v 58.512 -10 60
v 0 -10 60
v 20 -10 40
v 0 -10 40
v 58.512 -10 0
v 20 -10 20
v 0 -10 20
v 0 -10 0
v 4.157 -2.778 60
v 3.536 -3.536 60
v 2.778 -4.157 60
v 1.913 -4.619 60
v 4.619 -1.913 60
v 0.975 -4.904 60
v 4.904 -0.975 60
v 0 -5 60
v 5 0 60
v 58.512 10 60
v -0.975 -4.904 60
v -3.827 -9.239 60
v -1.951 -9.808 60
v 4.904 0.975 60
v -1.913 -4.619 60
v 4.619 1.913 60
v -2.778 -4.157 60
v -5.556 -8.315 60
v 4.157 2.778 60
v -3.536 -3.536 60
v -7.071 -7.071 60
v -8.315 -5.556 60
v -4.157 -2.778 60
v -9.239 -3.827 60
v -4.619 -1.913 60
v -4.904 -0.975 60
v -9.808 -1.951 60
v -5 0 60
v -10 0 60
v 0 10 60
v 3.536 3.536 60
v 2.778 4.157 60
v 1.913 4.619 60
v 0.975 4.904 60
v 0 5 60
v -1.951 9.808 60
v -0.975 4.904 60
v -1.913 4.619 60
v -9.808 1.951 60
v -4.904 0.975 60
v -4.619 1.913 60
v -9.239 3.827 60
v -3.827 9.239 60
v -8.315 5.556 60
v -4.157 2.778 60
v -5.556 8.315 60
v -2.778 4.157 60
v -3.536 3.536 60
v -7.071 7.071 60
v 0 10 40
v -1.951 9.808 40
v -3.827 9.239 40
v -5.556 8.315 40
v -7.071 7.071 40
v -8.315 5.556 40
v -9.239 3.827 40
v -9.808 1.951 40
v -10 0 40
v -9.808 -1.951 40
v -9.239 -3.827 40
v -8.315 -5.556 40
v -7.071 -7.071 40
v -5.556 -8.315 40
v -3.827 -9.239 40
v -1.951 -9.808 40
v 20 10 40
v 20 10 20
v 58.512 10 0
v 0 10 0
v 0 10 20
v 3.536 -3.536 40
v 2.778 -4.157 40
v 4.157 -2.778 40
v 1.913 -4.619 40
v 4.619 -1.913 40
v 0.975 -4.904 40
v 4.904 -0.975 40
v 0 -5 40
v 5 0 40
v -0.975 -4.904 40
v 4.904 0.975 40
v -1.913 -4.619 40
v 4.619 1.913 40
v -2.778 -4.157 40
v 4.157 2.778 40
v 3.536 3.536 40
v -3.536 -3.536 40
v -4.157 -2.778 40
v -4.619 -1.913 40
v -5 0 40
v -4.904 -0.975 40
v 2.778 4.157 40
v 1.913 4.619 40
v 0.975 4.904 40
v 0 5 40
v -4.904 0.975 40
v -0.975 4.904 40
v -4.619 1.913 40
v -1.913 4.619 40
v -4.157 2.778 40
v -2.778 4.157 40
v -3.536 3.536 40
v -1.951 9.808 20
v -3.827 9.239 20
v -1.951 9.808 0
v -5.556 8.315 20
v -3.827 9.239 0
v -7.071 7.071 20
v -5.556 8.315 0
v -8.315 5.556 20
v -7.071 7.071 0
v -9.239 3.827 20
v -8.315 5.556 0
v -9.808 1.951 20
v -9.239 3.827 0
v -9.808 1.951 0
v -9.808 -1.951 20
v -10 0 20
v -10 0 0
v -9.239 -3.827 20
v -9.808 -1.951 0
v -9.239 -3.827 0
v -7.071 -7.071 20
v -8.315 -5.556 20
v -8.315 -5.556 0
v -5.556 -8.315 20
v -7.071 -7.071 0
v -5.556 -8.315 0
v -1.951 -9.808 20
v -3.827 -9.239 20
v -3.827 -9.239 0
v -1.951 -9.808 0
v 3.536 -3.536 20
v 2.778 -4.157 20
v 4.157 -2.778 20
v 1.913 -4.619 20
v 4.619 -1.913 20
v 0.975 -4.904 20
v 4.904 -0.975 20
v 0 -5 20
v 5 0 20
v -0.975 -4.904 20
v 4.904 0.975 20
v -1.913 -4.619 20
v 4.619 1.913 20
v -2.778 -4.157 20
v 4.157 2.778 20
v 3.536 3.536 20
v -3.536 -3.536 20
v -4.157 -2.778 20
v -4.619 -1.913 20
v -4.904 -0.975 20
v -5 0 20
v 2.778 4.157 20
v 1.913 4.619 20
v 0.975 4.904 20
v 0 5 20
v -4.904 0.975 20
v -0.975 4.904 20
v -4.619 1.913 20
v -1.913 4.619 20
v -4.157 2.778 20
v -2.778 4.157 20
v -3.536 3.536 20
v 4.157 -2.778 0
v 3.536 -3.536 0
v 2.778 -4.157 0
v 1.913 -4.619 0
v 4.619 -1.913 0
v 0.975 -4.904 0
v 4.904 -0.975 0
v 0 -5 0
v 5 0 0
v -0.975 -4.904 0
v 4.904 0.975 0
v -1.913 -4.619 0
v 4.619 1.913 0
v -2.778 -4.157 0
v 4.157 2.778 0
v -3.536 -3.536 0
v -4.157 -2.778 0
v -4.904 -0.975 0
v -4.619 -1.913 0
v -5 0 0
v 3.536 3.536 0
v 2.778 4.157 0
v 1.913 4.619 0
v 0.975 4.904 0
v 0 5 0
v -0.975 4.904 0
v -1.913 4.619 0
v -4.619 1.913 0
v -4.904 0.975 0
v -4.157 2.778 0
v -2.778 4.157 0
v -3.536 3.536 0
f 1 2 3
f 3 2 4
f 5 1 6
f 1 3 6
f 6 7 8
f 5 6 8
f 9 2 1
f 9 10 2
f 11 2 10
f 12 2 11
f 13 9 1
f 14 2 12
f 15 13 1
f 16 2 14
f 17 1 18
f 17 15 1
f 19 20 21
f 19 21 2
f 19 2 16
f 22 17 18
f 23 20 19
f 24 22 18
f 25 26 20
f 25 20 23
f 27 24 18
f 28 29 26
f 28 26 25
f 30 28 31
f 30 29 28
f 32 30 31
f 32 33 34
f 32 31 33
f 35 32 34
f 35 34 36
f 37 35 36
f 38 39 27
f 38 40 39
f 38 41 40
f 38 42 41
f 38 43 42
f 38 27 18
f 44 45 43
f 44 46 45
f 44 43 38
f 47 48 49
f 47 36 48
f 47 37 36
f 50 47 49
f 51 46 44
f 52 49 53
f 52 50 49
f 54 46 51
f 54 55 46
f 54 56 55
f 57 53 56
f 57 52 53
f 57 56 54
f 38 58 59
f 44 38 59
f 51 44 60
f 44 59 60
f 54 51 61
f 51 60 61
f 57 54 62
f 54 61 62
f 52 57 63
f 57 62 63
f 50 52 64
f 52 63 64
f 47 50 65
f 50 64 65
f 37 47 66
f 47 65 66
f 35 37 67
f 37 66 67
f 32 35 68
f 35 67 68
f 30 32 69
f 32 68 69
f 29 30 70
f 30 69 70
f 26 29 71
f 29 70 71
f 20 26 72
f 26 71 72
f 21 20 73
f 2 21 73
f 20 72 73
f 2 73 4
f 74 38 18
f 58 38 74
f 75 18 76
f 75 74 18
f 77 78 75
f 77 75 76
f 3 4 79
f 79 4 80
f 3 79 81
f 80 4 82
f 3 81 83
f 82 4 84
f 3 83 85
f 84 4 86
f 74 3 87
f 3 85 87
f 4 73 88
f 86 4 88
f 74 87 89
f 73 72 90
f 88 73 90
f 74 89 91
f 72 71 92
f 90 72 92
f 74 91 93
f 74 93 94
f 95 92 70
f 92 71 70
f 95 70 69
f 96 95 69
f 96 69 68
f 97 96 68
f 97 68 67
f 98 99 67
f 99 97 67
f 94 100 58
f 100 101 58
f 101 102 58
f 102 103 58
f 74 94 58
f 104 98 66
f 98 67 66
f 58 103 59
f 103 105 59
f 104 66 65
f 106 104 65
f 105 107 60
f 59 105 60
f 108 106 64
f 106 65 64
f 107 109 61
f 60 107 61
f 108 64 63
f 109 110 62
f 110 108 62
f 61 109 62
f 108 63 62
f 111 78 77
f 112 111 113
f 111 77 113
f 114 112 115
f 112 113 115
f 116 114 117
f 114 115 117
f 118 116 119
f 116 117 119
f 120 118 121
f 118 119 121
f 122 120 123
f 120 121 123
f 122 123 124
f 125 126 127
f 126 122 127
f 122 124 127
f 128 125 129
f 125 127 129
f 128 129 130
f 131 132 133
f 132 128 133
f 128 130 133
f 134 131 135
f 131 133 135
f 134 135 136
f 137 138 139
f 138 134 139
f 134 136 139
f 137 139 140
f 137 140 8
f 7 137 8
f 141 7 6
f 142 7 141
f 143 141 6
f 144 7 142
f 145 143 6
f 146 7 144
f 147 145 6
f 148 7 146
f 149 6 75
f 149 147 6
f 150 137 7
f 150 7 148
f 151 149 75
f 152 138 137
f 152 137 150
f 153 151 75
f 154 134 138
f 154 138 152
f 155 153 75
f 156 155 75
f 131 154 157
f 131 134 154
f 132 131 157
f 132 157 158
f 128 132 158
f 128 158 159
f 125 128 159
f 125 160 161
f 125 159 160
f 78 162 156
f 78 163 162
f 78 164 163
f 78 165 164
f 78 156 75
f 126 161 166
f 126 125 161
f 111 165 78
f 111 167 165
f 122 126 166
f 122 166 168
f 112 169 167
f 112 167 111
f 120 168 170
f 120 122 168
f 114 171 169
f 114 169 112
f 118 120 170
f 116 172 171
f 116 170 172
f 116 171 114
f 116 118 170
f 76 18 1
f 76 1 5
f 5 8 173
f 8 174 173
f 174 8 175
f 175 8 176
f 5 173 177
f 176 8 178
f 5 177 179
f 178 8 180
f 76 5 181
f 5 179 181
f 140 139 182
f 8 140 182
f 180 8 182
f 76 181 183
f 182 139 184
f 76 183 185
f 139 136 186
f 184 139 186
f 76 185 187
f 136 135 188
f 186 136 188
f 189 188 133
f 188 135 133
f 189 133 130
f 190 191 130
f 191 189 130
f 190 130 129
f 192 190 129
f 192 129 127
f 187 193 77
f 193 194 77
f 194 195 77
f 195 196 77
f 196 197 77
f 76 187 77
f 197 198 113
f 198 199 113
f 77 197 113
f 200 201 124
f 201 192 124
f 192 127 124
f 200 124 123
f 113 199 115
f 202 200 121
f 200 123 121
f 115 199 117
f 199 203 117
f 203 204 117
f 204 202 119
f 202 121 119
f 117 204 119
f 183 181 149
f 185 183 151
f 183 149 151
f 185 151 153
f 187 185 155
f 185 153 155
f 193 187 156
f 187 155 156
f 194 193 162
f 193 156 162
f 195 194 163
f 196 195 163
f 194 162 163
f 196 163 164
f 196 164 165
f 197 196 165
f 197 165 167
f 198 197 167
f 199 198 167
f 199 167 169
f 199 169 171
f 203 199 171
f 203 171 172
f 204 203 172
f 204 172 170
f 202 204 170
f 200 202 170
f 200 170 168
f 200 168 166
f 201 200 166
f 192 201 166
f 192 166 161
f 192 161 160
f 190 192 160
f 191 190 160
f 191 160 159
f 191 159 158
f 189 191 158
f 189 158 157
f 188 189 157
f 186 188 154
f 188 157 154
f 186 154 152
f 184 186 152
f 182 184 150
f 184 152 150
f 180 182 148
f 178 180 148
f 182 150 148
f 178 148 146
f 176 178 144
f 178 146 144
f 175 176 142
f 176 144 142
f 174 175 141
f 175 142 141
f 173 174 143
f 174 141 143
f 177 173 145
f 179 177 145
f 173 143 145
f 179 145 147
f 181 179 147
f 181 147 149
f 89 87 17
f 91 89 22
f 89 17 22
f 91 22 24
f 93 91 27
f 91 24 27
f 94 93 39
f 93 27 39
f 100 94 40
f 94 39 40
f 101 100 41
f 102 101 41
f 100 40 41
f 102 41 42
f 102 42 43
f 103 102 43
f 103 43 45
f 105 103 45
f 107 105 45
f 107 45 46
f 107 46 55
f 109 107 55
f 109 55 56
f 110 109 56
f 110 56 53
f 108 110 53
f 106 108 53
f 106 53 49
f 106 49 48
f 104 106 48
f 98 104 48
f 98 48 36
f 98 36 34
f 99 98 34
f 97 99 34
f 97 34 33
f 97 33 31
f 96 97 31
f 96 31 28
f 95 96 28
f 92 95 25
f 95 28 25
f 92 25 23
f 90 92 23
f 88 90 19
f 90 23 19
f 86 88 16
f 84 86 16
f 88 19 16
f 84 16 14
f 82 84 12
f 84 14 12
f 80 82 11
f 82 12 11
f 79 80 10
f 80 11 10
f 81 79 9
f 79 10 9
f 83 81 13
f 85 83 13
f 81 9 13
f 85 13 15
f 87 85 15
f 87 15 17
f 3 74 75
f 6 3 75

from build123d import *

# Parameters (mm, degrees)
SKETCH1_R               = 10
BOSS_EXTRUDE1_DEPTH     = 60
CUT_EXTRUDE1_DEPTH      = 20
CUT_EXTRUDE1_DEPTH_BACK = 40
SKETCH2_W               = 20
SKETCH2_H               = 28.944782362
SKETCH3_R               = 5
CUT_EXTRUDE3_DEPTH      = 120
SKETCH4_W               = 60
SKETCH4_H               = 20
BOSS_EXTRUDE2_DEPTH     = 5


with BuildPart() as part:
    # Sketch1 → Boss-Extrude1 (new body)
    with BuildSketch(Plane.XY):
        Circle(SKETCH1_R)
        with BuildLine():
            Line((53.512258846, 10), (0, 10))
            ThreePointArc((0, 10), (7.071067812, 7.071067812), (10, 0))
            ThreePointArc((10, 0), (7.071067812, -7.071067812), (0, -10))
            Line((0, -10), (53.512258846, -10))
            Line((53.512258846, -10), (53.512258846, 10))
        make_face()
    extrude(amount=BOSS_EXTRUDE1_DEPTH)

    # Sketch2 → Cut-Extrude1 (cut, two sides: drawn at the far end of the back side and taken through both)
    with BuildSketch(Plane(origin=(0, 0, 0), x_dir=(0, 0, -1), z_dir=(1, 0, 0)).offset(-CUT_EXTRUDE1_DEPTH_BACK)):
        with Locations((-30, 0)):
            Rectangle(SKETCH2_W, SKETCH2_H)
    extrude(amount=CUT_EXTRUDE1_DEPTH + CUT_EXTRUDE1_DEPTH_BACK, mode=Mode.SUBTRACT)

    # Sketch3 → Cut-Extrude3 (cut)
    with BuildSketch(Plane.XY.offset(60)):
        Circle(SKETCH3_R)
    extrude(amount=-CUT_EXTRUDE3_DEPTH, mode=Mode.SUBTRACT)

    # Sketch4 → Boss-Extrude2 (add)
    with BuildSketch(Plane(origin=(53.512258846, 0, 0), x_dir=(0, 0, -1), z_dir=(1, 0, 0))):
        with Locations((-30, 0)):
            Rectangle(SKETCH4_W, SKETCH4_H)
    extrude(amount=BOSS_EXTRUDE2_DEPTH)


solid = part.part
